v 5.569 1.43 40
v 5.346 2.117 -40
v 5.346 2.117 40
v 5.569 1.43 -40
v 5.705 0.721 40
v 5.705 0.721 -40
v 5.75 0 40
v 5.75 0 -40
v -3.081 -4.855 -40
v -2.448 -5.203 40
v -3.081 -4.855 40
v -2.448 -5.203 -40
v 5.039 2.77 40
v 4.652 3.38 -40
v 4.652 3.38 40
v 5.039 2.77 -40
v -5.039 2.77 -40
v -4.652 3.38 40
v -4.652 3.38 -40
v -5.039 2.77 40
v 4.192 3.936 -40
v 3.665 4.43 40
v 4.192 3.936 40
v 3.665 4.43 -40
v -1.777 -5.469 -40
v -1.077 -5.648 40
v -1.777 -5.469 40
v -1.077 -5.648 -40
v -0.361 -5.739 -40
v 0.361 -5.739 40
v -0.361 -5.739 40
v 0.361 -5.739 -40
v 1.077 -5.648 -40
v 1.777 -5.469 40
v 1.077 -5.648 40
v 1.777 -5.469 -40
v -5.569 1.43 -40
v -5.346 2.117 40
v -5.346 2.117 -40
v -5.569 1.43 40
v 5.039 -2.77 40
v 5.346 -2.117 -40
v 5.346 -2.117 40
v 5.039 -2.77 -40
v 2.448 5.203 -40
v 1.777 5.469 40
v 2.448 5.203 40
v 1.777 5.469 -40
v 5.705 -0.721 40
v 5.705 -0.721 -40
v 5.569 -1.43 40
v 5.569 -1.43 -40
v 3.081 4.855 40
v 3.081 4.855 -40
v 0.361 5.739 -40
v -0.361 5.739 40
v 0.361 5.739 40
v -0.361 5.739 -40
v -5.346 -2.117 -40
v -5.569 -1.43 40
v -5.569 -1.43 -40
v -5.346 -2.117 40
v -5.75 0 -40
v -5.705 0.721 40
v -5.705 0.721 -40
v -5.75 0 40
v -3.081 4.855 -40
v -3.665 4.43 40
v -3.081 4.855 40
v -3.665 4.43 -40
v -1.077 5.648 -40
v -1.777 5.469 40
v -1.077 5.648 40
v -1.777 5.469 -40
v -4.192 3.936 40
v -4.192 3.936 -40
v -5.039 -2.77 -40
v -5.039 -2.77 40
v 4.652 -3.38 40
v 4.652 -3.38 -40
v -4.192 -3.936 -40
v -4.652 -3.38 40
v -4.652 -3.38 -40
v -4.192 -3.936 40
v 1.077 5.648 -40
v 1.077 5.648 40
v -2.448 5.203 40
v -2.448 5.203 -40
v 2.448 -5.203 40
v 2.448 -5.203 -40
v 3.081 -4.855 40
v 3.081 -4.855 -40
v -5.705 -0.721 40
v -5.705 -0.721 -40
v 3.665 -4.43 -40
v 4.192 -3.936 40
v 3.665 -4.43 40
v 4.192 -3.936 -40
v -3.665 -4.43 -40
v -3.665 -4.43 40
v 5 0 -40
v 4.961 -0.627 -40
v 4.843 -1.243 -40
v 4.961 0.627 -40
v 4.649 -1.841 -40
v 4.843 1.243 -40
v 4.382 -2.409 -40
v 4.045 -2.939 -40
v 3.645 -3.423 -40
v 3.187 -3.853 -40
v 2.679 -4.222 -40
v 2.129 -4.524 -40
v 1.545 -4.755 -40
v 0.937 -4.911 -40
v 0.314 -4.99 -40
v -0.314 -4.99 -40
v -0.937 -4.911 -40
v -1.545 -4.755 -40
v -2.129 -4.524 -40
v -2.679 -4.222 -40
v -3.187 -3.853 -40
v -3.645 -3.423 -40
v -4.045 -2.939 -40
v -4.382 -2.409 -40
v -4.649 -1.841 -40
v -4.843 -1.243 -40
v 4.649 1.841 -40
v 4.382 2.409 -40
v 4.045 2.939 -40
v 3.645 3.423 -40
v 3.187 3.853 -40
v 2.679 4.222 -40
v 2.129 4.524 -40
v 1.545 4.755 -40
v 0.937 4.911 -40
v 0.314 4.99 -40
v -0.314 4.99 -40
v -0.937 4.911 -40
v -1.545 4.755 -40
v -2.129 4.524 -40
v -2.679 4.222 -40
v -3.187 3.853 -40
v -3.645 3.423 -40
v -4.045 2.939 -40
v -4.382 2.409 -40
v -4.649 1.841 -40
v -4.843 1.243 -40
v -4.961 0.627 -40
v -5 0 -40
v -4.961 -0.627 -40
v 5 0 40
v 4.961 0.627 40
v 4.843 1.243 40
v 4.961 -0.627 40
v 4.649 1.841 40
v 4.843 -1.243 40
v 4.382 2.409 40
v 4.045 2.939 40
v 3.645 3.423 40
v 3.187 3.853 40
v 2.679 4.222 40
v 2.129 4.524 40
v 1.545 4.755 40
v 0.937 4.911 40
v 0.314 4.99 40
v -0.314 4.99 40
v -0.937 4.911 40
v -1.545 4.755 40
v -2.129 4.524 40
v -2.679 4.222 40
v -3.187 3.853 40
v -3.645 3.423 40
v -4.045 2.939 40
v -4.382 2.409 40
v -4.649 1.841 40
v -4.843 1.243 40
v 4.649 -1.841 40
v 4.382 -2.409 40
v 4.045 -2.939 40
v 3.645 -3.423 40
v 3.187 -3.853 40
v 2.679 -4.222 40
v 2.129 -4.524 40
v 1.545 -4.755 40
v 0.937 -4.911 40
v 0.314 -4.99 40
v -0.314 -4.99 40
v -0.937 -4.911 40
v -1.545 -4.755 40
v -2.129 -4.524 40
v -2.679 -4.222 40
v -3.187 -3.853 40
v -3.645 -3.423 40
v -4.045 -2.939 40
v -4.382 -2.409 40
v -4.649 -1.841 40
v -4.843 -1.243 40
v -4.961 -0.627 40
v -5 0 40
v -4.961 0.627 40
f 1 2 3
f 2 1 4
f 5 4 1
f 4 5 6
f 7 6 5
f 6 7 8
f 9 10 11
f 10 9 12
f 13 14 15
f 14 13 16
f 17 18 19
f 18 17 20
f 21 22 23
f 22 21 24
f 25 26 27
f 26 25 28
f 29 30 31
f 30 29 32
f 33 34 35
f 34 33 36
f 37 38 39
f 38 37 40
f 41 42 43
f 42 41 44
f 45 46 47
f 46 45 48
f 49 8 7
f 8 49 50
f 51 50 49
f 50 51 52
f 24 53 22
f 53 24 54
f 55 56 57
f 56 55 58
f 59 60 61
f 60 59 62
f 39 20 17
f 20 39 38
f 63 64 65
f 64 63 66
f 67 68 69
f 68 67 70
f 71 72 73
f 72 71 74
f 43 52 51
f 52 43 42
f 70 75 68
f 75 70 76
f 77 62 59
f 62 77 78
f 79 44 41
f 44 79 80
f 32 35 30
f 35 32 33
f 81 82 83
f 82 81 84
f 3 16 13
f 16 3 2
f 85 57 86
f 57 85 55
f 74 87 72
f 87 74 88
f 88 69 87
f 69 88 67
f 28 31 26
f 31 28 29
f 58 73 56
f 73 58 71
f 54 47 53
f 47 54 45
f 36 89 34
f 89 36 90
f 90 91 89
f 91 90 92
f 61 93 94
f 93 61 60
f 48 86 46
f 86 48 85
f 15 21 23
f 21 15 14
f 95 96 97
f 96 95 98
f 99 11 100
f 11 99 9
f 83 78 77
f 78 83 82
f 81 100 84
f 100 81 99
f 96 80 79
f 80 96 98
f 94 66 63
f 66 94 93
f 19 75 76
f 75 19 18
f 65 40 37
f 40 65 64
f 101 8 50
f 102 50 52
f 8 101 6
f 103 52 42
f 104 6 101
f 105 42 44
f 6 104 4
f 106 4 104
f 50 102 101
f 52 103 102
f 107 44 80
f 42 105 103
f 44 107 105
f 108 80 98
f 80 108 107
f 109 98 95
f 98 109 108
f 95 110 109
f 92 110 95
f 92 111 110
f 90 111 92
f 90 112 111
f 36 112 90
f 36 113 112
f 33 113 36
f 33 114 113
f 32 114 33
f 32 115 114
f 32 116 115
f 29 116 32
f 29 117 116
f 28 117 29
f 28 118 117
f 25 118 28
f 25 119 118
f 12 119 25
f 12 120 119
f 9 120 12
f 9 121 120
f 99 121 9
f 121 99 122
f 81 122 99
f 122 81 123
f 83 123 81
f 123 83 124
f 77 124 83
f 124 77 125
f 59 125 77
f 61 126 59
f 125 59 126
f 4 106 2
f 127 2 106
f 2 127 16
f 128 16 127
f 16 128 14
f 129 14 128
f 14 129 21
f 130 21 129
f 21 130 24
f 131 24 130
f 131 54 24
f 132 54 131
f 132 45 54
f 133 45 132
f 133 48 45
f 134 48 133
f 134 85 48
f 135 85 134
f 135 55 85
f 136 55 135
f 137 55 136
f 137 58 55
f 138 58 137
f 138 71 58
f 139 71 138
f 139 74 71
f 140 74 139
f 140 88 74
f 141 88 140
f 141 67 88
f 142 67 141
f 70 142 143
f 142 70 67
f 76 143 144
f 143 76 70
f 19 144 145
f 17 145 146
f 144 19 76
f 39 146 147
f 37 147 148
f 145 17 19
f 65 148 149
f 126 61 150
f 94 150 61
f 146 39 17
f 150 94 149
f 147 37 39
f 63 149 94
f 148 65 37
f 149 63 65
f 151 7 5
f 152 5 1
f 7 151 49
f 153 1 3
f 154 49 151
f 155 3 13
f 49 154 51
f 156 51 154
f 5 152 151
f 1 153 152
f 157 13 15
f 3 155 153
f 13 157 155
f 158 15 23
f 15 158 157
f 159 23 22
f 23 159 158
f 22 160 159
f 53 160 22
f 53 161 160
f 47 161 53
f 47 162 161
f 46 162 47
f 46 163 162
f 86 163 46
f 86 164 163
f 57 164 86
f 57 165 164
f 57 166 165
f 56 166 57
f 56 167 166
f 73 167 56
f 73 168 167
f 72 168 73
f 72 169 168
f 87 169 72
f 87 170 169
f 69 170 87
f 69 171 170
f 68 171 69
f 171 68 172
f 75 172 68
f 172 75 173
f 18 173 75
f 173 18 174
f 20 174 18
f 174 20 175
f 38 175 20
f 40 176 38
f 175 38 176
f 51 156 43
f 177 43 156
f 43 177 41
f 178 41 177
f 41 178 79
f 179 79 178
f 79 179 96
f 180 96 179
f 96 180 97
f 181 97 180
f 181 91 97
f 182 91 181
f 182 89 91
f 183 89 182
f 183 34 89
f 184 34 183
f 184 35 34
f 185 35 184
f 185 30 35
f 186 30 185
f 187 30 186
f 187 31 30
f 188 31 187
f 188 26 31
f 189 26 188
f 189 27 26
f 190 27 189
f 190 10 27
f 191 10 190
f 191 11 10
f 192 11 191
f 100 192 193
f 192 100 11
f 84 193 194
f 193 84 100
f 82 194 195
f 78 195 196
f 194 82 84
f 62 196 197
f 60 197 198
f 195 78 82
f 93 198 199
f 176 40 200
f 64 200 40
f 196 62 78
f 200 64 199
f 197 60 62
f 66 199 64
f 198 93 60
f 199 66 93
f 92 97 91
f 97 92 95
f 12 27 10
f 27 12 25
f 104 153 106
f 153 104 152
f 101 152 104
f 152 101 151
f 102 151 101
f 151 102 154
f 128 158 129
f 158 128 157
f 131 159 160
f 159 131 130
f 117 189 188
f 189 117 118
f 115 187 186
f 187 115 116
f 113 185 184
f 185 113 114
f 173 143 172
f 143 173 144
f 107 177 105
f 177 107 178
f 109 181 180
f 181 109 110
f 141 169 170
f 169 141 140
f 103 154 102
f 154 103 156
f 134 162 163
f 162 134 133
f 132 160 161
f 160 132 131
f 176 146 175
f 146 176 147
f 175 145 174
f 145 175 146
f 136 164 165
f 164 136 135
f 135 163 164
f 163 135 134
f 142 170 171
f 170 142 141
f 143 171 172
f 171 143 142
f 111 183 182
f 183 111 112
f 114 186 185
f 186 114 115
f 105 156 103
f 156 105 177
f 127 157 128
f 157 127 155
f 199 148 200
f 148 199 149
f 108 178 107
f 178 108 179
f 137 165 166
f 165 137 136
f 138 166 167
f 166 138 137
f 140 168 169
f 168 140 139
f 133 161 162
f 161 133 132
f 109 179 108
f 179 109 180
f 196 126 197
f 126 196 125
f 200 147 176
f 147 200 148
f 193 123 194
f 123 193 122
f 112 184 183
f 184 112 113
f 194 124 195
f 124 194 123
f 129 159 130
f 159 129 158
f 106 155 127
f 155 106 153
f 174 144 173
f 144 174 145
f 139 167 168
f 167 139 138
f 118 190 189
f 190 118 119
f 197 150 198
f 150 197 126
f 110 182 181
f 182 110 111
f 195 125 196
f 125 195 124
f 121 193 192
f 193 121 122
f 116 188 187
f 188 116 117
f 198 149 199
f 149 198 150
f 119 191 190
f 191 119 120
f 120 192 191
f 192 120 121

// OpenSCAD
$fn = 50;


difference() {
	union() {
		translate(v = [0, 0, -40.0000000000]) {
			cylinder(h = 80, r = 5.7500000000);
		}
	}
	union() {
		translate(v = [0, 0, -100.0000000000]) {
			cylinder(h = 200, r = 5.0000000000);
		}
	}
}
